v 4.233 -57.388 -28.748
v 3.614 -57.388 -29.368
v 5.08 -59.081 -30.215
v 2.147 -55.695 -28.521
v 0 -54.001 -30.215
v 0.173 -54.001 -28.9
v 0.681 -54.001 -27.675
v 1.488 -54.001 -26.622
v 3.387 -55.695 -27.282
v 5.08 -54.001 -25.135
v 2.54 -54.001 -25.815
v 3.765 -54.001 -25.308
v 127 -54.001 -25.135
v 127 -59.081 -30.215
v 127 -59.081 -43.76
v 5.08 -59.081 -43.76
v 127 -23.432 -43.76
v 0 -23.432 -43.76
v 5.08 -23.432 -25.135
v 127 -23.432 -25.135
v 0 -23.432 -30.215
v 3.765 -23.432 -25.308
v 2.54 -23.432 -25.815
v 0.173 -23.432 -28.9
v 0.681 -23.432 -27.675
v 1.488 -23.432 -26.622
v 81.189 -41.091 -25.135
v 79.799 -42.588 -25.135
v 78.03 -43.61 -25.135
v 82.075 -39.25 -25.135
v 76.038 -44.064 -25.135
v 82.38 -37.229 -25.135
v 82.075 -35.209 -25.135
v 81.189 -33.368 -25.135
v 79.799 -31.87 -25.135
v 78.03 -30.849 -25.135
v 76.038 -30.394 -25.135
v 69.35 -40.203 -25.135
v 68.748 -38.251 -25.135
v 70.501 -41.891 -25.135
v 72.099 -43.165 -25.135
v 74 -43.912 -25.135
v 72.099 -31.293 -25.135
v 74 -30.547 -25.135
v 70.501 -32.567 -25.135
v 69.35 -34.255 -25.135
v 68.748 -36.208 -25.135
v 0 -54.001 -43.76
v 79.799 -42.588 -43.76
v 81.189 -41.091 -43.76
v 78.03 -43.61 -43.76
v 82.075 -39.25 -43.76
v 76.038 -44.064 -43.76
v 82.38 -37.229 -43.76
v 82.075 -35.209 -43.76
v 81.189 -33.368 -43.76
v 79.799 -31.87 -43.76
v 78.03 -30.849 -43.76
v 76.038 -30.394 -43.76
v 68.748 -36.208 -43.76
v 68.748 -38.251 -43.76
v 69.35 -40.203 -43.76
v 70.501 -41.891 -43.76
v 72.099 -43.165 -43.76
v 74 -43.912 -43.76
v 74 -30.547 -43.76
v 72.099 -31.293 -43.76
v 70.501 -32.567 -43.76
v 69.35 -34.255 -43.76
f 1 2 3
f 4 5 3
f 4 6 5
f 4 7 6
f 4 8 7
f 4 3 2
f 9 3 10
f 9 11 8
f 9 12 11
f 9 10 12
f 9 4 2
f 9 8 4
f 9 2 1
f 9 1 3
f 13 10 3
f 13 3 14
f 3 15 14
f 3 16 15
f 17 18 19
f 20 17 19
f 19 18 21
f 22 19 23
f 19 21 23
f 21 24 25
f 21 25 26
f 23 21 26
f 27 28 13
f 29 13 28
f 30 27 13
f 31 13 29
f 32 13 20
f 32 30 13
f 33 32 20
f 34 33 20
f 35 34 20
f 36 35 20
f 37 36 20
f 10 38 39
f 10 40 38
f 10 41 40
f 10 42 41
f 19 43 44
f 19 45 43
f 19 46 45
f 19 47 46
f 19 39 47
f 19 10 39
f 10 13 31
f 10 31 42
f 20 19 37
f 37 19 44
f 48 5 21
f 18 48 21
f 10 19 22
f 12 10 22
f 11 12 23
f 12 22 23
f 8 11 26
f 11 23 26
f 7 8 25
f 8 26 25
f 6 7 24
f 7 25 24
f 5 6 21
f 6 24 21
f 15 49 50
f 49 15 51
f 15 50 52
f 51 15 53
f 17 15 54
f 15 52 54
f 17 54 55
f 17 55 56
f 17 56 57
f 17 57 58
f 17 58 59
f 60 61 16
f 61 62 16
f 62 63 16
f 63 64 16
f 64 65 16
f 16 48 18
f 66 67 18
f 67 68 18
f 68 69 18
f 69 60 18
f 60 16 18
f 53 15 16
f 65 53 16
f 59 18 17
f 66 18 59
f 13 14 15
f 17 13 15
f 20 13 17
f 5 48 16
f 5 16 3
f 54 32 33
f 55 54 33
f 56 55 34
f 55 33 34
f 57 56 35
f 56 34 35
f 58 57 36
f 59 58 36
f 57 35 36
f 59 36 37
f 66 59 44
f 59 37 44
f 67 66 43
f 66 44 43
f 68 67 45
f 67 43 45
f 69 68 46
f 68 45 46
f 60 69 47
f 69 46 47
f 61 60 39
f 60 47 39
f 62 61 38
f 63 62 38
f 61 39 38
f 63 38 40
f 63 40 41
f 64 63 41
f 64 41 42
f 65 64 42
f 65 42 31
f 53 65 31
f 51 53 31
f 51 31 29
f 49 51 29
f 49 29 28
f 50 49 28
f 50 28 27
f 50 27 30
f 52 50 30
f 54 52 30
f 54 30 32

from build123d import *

# Parameters (mm, degrees)
F0_W     = 35.6490109116
F0_H     = 18.6256058514
F1_DEPTH = 127
F2_R     = 6.8542963407
F3_DEPTH = 25.4
F4_R     = 5.08
F5_SIZE  = 5.07999


# Not quite as in the source:
# - a fillet or chamfer is up to 0.001 mm smaller than in the source, because OpenCascade refuses the exact size


with BuildPart() as f1:
    # F0 (on Right) → F1 (new body)
    with BuildSketch(Plane.YZ):
        with Locations((-41.2567211315, -34.4473589212)):
            Rectangle(F0_W, F0_H)
    extrude(amount=F1_DEPTH)

    # F2 (on face) → F3 (cut)
    with BuildSketch(Plane.XY.offset(-25.1345559955)):
        with Locations((75.5256735351, -37.2293450889)):
            Circle(F2_R)
    extrude(amount=-F3_DEPTH, mode=Mode.SUBTRACT)

    # F4
    f4_edges = [f1.edges().sort_by_distance(p)[0] for p in [
        (0, -41.256721, -25.134556),
    ]]
    fillet(f4_edges, radius=F4_R)

    # F5 (size 5.08 in the source; OpenCascade refuses exactly that, so slightly less here)
    f5_edges = [f1.edges().sort_by_distance(p)[0] for p in [
        (66.04, -59.081227, -25.134556),
    ]]
    chamfer(f5_edges, length=F5_SIZE)


solid = f1.part
